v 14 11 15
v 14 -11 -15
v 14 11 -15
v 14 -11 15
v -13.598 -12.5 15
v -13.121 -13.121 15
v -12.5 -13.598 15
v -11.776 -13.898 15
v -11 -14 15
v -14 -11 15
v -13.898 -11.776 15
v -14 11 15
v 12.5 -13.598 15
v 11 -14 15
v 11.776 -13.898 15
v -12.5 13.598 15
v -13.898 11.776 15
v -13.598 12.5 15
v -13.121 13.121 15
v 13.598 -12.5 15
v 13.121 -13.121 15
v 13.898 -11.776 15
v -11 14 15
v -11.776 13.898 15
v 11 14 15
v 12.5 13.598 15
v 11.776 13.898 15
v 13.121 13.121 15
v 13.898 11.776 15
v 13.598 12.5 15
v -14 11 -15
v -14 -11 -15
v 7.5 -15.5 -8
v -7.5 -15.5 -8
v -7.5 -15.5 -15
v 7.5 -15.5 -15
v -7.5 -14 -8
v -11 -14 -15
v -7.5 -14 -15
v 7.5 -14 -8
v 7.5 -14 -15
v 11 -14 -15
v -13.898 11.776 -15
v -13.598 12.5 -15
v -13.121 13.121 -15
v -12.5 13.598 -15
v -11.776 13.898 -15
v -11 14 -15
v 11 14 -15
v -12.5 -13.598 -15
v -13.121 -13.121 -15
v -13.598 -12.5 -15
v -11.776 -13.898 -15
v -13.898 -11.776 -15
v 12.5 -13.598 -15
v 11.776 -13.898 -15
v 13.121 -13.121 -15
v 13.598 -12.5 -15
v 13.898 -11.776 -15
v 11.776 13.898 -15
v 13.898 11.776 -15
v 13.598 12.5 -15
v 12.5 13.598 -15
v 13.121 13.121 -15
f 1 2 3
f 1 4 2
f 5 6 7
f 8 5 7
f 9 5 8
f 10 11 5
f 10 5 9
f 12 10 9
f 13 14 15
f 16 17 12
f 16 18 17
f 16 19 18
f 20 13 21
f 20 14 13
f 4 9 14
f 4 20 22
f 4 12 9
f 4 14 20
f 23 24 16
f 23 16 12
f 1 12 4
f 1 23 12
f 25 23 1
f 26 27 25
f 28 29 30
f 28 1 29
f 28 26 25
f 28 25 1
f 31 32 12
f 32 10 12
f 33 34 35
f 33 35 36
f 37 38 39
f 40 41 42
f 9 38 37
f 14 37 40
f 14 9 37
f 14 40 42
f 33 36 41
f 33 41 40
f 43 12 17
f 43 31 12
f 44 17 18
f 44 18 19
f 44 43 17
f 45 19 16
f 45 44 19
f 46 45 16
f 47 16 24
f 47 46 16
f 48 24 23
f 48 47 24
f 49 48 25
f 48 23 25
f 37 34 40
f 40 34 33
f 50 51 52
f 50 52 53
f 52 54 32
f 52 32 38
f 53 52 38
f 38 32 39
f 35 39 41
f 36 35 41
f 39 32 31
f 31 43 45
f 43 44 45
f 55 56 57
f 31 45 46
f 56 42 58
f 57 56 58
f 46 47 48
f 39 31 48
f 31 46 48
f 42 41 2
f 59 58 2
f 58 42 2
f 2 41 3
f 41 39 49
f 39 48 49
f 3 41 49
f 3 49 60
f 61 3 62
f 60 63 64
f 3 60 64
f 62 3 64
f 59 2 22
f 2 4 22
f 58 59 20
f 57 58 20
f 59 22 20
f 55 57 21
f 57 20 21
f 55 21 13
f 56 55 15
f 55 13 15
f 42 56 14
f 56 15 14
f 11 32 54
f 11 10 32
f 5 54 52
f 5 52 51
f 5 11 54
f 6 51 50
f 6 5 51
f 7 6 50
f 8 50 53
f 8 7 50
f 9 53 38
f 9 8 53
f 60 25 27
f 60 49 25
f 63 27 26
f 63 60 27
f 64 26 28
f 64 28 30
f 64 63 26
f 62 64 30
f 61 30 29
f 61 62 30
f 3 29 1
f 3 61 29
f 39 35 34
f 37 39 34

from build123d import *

# Parameters (mm, degrees)
SKETCH1_W           = 28
SKETCH1_H           = 28
BOSS_EXTRUDE1_DEPTH = 15
SKETCH2_W           = 15
SKETCH2_H           = 7
BOSS_EXTRUDE2_DEPTH = 1.5
FILLET1_R           = 3


with BuildPart() as part:
    # Sketch1 → Boss-Extrude1 (new body, symmetric)
    with BuildSketch(Plane.XY):
        Rectangle(SKETCH1_W, SKETCH1_H)
    extrude(amount=BOSS_EXTRUDE1_DEPTH, both=True)

    # Sketch2 → Boss-Extrude2 (add, symmetric)
    with BuildSketch(Plane.XZ.offset(14)):
        with Locations((0, -11.5)):
            Rectangle(SKETCH2_W, SKETCH2_H)
    extrude(amount=BOSS_EXTRUDE2_DEPTH, both=True)

    # Fillet1
    fillet1_edges = [part.edges().sort_by_distance(p)[0] for p in [
        (14, -14, 0),
        (-14, -14, 0),
        (-14, 14, 0),
        (14, 14, 0),
    ]]
    fillet(fillet1_edges, radius=FILLET1_R)


solid = part.part
